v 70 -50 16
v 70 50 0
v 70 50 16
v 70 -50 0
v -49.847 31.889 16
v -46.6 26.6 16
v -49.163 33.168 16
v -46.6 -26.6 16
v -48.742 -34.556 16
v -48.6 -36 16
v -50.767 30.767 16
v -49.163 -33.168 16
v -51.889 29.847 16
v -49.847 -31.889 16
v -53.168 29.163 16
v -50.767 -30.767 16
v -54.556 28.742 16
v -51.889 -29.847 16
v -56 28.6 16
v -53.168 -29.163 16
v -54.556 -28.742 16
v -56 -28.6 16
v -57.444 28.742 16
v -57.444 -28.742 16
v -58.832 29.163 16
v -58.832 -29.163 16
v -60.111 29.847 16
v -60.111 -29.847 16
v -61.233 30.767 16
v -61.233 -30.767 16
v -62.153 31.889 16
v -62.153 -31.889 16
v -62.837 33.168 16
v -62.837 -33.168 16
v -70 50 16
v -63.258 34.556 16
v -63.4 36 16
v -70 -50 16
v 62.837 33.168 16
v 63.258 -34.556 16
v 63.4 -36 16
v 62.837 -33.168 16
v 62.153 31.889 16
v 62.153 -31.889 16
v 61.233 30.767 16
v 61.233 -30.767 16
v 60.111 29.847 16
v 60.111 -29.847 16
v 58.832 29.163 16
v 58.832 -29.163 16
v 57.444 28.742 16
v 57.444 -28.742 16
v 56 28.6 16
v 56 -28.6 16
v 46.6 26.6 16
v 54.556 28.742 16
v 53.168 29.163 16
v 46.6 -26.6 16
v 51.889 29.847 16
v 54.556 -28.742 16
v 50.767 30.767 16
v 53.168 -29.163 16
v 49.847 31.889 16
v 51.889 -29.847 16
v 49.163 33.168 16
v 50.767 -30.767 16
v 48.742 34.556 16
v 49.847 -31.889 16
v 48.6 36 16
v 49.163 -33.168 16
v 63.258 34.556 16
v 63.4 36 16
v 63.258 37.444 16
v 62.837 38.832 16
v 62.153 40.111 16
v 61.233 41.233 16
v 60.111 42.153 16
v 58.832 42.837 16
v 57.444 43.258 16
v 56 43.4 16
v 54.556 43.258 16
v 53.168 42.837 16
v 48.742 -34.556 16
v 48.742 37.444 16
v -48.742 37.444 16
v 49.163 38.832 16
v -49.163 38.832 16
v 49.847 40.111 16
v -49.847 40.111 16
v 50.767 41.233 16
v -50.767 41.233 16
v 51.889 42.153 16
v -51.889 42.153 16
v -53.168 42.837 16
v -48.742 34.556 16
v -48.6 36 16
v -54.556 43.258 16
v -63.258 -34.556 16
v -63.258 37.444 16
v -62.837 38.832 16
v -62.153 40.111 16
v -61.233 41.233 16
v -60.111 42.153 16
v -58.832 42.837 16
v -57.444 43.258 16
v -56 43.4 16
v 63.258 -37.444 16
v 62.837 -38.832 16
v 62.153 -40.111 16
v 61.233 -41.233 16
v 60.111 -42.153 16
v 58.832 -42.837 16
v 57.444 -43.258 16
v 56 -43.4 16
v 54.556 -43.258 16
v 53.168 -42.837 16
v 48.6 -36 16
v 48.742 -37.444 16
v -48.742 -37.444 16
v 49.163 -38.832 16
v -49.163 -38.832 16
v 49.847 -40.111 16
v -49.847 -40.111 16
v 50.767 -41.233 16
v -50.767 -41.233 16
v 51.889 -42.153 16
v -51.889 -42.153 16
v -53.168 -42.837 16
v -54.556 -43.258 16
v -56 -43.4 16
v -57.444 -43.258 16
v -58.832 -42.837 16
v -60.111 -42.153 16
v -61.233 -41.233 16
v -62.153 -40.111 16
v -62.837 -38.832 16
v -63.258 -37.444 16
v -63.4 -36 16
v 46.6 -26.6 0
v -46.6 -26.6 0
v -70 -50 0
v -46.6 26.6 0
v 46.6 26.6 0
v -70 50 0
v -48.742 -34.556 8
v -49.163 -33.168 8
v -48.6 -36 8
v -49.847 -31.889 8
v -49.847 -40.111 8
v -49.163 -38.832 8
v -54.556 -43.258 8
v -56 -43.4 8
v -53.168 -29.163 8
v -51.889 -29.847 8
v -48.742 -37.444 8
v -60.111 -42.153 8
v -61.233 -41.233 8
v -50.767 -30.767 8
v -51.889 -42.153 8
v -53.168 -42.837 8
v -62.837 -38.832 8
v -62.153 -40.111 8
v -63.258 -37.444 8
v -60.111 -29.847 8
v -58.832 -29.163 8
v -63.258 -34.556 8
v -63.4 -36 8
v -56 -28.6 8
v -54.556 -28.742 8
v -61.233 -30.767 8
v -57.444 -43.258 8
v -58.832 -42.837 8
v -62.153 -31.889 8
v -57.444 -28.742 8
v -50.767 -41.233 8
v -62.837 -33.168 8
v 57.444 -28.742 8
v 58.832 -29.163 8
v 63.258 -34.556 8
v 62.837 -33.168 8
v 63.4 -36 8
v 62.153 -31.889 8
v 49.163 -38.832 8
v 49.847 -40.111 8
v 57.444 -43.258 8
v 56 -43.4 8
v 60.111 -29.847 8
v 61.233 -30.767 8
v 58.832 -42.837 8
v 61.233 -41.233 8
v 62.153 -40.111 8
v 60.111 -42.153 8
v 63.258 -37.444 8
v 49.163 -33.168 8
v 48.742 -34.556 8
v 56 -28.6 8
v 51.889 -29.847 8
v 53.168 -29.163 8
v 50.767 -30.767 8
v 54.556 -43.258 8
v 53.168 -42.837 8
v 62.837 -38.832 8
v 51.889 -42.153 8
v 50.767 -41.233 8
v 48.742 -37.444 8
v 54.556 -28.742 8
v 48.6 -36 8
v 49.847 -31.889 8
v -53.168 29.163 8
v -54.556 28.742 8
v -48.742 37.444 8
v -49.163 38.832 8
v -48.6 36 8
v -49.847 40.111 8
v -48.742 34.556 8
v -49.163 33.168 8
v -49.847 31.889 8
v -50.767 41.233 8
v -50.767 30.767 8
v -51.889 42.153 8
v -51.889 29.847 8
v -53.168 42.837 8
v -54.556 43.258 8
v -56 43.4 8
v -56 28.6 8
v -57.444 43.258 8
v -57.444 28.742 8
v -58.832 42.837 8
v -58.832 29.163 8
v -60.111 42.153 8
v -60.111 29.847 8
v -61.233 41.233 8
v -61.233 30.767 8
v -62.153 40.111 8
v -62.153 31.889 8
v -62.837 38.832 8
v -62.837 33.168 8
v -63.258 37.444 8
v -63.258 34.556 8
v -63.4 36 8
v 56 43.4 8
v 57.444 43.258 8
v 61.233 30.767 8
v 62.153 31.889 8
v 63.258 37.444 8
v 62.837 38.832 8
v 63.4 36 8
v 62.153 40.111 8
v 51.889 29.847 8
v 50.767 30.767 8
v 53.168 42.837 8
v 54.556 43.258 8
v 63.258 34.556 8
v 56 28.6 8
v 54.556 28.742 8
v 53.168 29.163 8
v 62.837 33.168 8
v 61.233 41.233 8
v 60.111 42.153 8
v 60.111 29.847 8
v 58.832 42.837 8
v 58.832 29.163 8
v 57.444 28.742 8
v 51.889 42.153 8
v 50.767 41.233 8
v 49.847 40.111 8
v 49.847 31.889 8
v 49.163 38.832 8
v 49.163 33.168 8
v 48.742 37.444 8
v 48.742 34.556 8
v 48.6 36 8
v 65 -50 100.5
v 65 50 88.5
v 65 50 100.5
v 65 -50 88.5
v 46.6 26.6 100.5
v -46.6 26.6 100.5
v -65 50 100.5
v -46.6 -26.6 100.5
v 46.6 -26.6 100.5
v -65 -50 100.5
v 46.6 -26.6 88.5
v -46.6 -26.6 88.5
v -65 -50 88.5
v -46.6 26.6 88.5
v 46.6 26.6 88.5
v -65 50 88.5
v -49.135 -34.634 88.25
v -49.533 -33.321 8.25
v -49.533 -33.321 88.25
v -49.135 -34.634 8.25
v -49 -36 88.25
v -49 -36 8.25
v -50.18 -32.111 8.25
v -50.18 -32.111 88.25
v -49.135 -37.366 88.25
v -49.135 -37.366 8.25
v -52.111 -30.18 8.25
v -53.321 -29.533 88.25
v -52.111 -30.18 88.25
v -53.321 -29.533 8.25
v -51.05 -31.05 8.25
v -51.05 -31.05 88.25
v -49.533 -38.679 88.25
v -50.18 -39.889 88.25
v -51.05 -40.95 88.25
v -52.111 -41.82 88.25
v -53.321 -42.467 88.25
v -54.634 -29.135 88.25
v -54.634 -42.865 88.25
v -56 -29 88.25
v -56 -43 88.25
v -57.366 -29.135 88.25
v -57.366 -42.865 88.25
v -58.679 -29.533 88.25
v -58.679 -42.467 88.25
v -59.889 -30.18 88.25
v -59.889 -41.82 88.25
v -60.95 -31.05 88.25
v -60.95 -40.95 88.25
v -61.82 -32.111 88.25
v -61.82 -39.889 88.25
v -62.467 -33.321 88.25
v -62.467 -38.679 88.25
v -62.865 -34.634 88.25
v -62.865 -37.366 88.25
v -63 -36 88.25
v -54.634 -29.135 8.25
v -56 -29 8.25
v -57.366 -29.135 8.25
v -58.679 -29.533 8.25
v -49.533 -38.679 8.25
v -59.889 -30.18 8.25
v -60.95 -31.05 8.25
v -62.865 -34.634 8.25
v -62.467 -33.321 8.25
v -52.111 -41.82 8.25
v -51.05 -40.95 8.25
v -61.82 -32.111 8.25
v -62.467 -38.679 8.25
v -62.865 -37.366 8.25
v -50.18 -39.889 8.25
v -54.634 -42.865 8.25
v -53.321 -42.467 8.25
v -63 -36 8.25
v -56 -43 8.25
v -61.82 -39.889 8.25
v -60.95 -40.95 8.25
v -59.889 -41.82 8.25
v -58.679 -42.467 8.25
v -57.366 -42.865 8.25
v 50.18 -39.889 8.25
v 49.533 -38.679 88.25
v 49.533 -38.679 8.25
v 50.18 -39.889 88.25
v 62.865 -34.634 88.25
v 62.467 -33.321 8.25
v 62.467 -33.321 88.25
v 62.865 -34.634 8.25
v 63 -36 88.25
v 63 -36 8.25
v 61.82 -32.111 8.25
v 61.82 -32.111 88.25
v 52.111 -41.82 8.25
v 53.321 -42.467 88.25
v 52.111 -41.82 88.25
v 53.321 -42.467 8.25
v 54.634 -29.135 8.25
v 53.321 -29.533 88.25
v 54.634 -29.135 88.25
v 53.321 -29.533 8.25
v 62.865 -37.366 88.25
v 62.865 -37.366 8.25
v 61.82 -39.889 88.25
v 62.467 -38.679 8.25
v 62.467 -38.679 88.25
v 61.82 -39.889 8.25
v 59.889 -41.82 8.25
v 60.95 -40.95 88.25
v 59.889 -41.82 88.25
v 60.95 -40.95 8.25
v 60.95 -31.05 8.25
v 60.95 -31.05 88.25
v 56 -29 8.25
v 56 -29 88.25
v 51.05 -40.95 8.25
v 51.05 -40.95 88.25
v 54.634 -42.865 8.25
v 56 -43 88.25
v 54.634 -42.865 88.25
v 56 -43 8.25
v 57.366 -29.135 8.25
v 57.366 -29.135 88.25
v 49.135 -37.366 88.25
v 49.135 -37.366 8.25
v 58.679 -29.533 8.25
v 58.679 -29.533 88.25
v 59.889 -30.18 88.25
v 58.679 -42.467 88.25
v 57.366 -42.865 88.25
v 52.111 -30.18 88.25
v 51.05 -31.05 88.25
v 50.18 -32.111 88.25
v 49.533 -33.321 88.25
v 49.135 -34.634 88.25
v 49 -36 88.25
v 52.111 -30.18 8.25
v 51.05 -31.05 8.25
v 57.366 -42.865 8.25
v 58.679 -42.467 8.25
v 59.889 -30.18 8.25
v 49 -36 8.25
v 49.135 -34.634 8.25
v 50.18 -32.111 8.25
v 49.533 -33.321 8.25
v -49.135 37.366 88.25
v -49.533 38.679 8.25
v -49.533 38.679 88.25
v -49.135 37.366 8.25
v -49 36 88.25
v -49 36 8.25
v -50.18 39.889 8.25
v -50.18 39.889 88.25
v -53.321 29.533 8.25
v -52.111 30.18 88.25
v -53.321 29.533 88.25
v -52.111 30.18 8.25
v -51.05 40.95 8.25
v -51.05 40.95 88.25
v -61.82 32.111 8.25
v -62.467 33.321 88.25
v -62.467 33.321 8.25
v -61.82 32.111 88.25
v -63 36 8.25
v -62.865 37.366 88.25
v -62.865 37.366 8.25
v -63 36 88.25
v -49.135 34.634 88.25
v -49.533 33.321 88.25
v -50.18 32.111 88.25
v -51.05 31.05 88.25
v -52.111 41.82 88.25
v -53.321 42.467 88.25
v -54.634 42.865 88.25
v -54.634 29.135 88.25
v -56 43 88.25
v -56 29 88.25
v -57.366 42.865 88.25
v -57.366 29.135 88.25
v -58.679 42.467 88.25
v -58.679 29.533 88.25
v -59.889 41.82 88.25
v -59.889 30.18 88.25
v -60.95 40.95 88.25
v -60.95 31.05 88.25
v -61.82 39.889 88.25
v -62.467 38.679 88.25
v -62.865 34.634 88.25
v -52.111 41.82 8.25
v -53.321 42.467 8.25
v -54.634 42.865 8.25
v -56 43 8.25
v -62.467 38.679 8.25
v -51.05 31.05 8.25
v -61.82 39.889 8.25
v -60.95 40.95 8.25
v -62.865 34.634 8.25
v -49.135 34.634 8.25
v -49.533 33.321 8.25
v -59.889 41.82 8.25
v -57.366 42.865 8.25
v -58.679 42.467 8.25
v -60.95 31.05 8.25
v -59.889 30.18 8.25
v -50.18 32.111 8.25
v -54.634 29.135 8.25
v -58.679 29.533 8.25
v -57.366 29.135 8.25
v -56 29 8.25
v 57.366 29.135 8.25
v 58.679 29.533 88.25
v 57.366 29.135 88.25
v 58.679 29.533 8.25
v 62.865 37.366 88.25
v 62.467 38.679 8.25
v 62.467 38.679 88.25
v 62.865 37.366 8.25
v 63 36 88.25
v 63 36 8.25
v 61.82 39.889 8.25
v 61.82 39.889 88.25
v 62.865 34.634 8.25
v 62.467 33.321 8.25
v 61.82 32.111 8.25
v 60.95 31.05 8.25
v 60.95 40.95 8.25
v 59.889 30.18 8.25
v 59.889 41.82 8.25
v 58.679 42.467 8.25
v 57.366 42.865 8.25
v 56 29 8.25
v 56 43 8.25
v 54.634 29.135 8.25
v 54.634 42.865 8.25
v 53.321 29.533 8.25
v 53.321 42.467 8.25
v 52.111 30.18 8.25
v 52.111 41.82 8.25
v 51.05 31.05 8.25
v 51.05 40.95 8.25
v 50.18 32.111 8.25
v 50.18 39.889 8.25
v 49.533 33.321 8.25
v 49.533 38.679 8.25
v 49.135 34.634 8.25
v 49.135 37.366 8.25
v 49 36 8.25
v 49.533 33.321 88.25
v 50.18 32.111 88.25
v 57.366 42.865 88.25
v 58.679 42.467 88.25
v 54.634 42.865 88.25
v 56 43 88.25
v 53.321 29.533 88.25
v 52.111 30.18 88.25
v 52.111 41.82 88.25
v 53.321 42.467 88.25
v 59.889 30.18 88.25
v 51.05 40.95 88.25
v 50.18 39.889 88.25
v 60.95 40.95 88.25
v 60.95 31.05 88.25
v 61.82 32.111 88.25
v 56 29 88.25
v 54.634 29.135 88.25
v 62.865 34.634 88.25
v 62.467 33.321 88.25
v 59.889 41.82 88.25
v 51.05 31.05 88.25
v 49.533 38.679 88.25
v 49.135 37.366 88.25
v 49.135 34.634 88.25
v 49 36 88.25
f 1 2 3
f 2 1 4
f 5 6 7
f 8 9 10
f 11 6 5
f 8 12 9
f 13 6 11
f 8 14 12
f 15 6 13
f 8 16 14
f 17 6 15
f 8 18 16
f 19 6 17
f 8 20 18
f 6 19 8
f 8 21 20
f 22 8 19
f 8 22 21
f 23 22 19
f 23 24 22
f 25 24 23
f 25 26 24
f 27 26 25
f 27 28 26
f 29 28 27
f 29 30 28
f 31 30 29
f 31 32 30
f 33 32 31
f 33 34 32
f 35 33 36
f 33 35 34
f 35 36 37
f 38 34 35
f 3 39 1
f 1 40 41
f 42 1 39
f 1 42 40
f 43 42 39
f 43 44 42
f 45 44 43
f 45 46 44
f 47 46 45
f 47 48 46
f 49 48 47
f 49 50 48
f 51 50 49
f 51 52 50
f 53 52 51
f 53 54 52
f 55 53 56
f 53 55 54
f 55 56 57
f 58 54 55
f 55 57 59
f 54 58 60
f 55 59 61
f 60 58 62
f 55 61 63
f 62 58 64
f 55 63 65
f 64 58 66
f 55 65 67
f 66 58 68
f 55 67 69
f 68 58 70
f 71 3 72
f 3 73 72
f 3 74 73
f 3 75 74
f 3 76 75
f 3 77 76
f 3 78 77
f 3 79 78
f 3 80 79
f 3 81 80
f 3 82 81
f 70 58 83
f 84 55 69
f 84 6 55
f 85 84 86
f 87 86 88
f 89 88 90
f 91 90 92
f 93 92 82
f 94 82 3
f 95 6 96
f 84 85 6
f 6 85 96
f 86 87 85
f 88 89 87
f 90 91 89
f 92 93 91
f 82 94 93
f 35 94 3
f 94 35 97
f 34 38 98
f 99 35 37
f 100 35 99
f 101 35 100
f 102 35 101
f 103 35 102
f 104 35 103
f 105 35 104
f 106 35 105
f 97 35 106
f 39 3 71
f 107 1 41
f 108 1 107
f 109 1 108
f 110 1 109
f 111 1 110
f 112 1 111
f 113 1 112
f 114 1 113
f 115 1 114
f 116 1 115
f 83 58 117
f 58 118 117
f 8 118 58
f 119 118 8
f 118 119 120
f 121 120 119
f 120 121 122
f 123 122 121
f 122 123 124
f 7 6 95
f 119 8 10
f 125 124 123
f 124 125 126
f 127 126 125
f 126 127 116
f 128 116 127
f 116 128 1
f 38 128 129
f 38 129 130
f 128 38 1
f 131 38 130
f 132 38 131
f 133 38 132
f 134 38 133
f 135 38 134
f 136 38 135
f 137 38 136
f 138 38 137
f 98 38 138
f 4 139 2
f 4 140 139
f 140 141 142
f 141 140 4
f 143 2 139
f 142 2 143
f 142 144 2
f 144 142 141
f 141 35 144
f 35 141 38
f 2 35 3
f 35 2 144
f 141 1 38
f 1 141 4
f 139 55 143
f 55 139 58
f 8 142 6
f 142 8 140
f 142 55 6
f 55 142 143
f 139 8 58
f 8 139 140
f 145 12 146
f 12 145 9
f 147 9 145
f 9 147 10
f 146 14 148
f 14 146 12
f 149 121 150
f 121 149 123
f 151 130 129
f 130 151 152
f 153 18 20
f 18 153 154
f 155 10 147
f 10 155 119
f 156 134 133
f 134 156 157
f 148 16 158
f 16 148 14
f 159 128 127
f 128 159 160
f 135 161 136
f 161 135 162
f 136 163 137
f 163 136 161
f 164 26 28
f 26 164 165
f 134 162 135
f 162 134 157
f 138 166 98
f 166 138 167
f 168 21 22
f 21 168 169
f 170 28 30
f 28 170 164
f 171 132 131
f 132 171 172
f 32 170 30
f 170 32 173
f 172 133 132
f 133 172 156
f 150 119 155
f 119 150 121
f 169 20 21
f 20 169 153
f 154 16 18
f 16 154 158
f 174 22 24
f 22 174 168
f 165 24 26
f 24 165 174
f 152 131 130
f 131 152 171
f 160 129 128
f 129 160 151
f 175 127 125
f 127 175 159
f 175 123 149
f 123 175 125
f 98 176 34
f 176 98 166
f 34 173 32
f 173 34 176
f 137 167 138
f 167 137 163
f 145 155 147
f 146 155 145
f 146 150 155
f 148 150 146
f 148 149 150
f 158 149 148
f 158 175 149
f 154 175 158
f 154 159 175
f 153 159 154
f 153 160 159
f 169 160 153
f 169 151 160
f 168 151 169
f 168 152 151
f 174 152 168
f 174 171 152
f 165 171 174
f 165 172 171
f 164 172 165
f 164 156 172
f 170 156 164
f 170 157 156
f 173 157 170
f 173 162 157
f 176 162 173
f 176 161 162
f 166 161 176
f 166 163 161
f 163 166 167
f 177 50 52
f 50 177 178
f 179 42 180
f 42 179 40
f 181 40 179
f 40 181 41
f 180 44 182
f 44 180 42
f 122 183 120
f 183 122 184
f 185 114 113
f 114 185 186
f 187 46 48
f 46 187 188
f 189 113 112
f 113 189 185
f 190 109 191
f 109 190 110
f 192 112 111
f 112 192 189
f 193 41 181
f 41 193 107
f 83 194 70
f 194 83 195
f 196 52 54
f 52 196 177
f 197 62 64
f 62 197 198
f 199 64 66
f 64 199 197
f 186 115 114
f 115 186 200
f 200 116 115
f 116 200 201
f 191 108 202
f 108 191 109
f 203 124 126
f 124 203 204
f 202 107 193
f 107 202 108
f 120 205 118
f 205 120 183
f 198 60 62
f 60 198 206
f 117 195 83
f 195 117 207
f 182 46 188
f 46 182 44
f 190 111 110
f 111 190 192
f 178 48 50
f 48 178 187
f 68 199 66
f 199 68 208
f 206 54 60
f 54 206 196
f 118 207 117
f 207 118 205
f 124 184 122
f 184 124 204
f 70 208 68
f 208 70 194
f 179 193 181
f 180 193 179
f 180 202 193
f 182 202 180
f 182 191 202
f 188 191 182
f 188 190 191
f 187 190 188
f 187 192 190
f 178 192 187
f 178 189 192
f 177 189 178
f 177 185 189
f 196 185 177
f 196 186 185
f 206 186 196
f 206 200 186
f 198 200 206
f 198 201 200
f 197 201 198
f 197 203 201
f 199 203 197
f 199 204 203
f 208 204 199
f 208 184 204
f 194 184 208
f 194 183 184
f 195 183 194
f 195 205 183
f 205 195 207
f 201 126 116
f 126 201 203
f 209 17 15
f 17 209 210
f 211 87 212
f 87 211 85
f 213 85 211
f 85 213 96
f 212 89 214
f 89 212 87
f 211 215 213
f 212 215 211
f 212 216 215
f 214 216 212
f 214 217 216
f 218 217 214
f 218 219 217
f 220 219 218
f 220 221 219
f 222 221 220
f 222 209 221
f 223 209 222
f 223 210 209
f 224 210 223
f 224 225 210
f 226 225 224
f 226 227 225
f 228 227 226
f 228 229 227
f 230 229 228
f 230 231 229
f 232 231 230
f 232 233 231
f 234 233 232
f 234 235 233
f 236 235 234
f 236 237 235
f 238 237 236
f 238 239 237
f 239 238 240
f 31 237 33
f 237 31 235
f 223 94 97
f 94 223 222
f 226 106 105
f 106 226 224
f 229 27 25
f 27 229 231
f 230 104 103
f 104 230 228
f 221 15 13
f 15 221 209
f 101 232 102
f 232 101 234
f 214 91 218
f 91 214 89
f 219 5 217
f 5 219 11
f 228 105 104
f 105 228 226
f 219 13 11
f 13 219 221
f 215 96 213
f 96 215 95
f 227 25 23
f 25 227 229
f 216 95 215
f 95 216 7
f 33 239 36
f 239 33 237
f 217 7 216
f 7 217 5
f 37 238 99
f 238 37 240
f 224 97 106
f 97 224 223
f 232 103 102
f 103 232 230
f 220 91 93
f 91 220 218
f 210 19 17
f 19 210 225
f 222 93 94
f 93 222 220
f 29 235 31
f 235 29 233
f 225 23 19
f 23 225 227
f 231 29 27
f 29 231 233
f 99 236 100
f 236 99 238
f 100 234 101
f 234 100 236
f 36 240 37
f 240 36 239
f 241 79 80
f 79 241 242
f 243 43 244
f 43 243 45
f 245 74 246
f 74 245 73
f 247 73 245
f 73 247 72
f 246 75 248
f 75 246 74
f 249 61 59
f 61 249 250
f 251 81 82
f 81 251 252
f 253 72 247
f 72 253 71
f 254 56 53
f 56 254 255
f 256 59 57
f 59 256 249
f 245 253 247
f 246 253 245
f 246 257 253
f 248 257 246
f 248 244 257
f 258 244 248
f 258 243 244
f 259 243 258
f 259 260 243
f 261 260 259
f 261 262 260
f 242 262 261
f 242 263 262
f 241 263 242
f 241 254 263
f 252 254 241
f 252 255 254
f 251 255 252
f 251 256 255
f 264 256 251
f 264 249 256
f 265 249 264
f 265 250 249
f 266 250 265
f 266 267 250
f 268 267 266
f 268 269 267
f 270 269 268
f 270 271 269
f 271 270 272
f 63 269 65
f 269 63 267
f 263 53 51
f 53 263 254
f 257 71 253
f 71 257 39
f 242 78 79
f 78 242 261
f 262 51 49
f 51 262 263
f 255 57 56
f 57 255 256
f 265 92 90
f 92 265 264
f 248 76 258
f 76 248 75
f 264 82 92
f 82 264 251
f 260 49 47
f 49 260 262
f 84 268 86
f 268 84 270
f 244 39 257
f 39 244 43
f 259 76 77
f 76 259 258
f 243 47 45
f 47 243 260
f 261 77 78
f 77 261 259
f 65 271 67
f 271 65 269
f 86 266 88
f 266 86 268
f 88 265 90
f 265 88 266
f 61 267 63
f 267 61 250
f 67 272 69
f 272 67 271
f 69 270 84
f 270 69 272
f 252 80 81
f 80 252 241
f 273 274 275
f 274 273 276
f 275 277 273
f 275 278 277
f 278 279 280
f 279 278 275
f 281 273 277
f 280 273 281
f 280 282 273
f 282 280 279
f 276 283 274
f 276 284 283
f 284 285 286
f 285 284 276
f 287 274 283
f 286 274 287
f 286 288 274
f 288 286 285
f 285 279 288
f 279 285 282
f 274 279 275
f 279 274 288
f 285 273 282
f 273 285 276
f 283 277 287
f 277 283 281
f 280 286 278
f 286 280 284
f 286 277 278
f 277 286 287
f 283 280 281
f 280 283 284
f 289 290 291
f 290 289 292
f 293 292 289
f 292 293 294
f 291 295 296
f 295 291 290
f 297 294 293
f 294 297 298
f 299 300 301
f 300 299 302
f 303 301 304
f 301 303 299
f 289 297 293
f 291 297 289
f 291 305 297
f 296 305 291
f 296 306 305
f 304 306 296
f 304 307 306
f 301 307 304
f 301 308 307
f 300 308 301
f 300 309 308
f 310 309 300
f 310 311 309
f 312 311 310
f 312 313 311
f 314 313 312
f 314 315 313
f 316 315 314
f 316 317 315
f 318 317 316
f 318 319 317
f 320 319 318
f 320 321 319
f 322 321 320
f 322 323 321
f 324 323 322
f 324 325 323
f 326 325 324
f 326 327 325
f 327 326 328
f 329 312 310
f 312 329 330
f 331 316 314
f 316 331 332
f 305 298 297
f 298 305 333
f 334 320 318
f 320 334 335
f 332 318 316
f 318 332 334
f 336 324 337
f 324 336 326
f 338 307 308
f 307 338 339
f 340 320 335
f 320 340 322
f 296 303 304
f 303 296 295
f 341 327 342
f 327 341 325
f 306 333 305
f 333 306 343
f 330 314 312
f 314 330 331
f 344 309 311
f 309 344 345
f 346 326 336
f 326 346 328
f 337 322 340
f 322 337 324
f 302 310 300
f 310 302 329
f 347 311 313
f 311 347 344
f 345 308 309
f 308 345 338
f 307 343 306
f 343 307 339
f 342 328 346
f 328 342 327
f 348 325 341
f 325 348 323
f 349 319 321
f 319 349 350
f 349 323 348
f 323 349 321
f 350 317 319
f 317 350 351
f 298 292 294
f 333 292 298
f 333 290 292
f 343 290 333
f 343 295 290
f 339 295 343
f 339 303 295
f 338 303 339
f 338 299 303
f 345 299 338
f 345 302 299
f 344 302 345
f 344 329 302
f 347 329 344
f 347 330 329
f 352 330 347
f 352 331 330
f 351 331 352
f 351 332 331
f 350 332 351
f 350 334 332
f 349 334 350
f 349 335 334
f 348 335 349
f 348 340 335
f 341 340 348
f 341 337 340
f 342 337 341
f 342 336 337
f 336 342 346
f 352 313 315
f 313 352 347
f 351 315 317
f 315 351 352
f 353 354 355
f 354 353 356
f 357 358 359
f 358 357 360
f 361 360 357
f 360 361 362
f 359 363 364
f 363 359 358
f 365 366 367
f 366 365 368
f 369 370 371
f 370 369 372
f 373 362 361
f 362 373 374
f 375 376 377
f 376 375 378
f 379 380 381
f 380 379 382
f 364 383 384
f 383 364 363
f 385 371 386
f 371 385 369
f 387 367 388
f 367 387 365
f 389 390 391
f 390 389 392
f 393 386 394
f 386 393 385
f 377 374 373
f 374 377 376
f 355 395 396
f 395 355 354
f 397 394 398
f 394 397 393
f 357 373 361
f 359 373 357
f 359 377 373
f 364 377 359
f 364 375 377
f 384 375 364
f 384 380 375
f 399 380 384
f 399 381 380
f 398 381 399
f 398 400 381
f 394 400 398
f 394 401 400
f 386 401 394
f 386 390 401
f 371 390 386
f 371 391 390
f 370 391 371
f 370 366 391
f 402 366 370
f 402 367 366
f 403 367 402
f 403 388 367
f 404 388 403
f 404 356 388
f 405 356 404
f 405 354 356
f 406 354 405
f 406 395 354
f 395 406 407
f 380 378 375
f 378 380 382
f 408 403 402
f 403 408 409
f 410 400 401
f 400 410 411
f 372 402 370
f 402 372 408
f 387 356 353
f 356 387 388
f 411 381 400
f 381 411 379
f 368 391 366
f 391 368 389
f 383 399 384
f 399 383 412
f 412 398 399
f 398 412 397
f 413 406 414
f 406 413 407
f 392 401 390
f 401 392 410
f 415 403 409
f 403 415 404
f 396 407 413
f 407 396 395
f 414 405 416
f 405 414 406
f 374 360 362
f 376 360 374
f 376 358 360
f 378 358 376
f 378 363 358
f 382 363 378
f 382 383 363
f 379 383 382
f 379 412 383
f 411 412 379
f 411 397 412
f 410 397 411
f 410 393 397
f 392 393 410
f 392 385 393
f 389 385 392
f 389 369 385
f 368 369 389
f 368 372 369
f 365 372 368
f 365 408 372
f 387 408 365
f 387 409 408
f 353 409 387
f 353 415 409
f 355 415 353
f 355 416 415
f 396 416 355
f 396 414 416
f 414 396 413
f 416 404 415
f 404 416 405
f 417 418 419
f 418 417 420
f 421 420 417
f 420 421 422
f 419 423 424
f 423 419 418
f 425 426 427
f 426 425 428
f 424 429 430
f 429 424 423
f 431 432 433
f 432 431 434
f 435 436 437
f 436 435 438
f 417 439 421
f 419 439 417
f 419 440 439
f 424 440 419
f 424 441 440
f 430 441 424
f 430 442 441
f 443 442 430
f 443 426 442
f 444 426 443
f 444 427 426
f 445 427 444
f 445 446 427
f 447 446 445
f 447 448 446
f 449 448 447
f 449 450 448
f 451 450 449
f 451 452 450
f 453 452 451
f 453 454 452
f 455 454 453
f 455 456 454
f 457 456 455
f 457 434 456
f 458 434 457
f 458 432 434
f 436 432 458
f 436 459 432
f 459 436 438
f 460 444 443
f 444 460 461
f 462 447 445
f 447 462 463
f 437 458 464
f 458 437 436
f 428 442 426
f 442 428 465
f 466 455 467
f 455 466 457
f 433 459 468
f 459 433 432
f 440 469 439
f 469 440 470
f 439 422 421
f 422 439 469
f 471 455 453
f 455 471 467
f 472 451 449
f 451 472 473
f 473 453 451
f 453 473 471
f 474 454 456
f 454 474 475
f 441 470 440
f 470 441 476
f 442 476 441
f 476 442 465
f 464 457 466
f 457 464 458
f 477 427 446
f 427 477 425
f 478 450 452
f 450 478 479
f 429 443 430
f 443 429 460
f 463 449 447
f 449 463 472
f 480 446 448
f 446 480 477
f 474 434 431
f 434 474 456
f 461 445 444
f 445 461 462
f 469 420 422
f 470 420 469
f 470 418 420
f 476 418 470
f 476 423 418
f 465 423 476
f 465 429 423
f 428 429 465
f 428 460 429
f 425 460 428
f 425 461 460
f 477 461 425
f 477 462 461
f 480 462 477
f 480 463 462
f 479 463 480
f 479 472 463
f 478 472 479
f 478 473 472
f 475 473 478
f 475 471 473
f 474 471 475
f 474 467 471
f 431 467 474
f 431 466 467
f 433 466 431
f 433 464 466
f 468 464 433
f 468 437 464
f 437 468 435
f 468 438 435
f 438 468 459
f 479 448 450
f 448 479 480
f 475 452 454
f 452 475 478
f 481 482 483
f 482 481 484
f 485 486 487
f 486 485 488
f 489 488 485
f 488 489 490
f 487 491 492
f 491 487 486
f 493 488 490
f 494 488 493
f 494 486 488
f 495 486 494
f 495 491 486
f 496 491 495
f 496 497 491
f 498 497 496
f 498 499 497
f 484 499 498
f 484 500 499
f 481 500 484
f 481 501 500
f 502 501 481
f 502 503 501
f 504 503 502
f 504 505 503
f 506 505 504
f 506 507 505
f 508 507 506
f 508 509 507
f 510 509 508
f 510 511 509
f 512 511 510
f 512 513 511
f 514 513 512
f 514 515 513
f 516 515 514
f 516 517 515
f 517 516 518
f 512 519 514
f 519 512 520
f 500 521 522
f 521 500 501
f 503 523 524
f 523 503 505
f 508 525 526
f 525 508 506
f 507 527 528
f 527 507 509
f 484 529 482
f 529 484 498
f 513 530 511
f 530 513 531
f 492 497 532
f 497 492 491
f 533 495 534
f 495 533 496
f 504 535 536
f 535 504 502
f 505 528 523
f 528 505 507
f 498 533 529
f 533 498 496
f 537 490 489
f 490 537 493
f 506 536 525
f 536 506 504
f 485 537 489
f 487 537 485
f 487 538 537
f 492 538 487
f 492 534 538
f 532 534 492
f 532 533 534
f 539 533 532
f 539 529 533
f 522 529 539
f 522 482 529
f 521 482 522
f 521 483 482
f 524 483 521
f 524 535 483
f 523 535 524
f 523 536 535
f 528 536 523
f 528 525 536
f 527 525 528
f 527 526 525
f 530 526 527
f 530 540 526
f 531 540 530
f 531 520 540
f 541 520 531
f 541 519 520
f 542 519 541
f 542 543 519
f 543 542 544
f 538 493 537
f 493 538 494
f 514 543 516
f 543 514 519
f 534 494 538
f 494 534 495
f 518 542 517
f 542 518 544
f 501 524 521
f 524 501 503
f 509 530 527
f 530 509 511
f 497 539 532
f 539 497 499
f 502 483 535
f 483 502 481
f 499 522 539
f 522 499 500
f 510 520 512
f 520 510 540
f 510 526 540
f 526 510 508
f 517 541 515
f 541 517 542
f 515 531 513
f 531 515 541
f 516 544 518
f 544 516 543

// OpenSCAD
$fn = 32;

// ------------------------------------------------------------------------
// Frame cube: base 140 x 100 mm, posts 80 mm tall
// Every part is its own module, assembly() places every instance.
// ------------------------------------------------------------------------

// --- part 1 ---
module base_frame() {
  difference() {
    translate([-70, -50, 0]) cube([140, 100, 16]);
    translate([-46.6, -26.6, -1]) cube([93.2, 53.2, 18]);
    translate([-56, -36, 8]) cylinder(h = 9, d = 14.8);
    translate([56, -36, 8]) cylinder(h = 9, d = 14.8);
    translate([-56, 36, 8]) cylinder(h = 9, d = 14.8);
    translate([56, 36, 8]) cylinder(h = 9, d = 14.8);
  }
}

// --- part 2 ---
module corner_post() {
  cylinder(h = 80, d = 14);
}

// --- part 3 ---
module top_frame() {
  difference() {
    translate([-65, -50, 0]) cube([130, 100, 12]);
    translate([-46.6, -26.6, -1]) cube([93.2, 53.2, 14]);
  }
}

// --- assembly ---
module assembly() {
  color([0.80, 0.24, 0.20]) translate([0, 0, 0]) rotate([0, 0, 0]) base_frame();
  color([0.20, 0.45, 0.75]) translate([-56, -36, 8.25]) rotate([0, 0, 0]) corner_post();
  color([0.25, 0.62, 0.32]) translate([56, -36, 8.25]) rotate([0, 0, 0]) corner_post();
  color([0.92, 0.70, 0.18]) translate([-56, 36, 8.25]) rotate([0, 0, 0]) corner_post();
  color([0.58, 0.35, 0.70]) translate([56, 36, 8.25]) rotate([0, 0, 0]) corner_post();
  color([0.16, 0.66, 0.66]) translate([0, 0, 88.5]) rotate([0, 0, 0]) top_frame();
}

assembly();
